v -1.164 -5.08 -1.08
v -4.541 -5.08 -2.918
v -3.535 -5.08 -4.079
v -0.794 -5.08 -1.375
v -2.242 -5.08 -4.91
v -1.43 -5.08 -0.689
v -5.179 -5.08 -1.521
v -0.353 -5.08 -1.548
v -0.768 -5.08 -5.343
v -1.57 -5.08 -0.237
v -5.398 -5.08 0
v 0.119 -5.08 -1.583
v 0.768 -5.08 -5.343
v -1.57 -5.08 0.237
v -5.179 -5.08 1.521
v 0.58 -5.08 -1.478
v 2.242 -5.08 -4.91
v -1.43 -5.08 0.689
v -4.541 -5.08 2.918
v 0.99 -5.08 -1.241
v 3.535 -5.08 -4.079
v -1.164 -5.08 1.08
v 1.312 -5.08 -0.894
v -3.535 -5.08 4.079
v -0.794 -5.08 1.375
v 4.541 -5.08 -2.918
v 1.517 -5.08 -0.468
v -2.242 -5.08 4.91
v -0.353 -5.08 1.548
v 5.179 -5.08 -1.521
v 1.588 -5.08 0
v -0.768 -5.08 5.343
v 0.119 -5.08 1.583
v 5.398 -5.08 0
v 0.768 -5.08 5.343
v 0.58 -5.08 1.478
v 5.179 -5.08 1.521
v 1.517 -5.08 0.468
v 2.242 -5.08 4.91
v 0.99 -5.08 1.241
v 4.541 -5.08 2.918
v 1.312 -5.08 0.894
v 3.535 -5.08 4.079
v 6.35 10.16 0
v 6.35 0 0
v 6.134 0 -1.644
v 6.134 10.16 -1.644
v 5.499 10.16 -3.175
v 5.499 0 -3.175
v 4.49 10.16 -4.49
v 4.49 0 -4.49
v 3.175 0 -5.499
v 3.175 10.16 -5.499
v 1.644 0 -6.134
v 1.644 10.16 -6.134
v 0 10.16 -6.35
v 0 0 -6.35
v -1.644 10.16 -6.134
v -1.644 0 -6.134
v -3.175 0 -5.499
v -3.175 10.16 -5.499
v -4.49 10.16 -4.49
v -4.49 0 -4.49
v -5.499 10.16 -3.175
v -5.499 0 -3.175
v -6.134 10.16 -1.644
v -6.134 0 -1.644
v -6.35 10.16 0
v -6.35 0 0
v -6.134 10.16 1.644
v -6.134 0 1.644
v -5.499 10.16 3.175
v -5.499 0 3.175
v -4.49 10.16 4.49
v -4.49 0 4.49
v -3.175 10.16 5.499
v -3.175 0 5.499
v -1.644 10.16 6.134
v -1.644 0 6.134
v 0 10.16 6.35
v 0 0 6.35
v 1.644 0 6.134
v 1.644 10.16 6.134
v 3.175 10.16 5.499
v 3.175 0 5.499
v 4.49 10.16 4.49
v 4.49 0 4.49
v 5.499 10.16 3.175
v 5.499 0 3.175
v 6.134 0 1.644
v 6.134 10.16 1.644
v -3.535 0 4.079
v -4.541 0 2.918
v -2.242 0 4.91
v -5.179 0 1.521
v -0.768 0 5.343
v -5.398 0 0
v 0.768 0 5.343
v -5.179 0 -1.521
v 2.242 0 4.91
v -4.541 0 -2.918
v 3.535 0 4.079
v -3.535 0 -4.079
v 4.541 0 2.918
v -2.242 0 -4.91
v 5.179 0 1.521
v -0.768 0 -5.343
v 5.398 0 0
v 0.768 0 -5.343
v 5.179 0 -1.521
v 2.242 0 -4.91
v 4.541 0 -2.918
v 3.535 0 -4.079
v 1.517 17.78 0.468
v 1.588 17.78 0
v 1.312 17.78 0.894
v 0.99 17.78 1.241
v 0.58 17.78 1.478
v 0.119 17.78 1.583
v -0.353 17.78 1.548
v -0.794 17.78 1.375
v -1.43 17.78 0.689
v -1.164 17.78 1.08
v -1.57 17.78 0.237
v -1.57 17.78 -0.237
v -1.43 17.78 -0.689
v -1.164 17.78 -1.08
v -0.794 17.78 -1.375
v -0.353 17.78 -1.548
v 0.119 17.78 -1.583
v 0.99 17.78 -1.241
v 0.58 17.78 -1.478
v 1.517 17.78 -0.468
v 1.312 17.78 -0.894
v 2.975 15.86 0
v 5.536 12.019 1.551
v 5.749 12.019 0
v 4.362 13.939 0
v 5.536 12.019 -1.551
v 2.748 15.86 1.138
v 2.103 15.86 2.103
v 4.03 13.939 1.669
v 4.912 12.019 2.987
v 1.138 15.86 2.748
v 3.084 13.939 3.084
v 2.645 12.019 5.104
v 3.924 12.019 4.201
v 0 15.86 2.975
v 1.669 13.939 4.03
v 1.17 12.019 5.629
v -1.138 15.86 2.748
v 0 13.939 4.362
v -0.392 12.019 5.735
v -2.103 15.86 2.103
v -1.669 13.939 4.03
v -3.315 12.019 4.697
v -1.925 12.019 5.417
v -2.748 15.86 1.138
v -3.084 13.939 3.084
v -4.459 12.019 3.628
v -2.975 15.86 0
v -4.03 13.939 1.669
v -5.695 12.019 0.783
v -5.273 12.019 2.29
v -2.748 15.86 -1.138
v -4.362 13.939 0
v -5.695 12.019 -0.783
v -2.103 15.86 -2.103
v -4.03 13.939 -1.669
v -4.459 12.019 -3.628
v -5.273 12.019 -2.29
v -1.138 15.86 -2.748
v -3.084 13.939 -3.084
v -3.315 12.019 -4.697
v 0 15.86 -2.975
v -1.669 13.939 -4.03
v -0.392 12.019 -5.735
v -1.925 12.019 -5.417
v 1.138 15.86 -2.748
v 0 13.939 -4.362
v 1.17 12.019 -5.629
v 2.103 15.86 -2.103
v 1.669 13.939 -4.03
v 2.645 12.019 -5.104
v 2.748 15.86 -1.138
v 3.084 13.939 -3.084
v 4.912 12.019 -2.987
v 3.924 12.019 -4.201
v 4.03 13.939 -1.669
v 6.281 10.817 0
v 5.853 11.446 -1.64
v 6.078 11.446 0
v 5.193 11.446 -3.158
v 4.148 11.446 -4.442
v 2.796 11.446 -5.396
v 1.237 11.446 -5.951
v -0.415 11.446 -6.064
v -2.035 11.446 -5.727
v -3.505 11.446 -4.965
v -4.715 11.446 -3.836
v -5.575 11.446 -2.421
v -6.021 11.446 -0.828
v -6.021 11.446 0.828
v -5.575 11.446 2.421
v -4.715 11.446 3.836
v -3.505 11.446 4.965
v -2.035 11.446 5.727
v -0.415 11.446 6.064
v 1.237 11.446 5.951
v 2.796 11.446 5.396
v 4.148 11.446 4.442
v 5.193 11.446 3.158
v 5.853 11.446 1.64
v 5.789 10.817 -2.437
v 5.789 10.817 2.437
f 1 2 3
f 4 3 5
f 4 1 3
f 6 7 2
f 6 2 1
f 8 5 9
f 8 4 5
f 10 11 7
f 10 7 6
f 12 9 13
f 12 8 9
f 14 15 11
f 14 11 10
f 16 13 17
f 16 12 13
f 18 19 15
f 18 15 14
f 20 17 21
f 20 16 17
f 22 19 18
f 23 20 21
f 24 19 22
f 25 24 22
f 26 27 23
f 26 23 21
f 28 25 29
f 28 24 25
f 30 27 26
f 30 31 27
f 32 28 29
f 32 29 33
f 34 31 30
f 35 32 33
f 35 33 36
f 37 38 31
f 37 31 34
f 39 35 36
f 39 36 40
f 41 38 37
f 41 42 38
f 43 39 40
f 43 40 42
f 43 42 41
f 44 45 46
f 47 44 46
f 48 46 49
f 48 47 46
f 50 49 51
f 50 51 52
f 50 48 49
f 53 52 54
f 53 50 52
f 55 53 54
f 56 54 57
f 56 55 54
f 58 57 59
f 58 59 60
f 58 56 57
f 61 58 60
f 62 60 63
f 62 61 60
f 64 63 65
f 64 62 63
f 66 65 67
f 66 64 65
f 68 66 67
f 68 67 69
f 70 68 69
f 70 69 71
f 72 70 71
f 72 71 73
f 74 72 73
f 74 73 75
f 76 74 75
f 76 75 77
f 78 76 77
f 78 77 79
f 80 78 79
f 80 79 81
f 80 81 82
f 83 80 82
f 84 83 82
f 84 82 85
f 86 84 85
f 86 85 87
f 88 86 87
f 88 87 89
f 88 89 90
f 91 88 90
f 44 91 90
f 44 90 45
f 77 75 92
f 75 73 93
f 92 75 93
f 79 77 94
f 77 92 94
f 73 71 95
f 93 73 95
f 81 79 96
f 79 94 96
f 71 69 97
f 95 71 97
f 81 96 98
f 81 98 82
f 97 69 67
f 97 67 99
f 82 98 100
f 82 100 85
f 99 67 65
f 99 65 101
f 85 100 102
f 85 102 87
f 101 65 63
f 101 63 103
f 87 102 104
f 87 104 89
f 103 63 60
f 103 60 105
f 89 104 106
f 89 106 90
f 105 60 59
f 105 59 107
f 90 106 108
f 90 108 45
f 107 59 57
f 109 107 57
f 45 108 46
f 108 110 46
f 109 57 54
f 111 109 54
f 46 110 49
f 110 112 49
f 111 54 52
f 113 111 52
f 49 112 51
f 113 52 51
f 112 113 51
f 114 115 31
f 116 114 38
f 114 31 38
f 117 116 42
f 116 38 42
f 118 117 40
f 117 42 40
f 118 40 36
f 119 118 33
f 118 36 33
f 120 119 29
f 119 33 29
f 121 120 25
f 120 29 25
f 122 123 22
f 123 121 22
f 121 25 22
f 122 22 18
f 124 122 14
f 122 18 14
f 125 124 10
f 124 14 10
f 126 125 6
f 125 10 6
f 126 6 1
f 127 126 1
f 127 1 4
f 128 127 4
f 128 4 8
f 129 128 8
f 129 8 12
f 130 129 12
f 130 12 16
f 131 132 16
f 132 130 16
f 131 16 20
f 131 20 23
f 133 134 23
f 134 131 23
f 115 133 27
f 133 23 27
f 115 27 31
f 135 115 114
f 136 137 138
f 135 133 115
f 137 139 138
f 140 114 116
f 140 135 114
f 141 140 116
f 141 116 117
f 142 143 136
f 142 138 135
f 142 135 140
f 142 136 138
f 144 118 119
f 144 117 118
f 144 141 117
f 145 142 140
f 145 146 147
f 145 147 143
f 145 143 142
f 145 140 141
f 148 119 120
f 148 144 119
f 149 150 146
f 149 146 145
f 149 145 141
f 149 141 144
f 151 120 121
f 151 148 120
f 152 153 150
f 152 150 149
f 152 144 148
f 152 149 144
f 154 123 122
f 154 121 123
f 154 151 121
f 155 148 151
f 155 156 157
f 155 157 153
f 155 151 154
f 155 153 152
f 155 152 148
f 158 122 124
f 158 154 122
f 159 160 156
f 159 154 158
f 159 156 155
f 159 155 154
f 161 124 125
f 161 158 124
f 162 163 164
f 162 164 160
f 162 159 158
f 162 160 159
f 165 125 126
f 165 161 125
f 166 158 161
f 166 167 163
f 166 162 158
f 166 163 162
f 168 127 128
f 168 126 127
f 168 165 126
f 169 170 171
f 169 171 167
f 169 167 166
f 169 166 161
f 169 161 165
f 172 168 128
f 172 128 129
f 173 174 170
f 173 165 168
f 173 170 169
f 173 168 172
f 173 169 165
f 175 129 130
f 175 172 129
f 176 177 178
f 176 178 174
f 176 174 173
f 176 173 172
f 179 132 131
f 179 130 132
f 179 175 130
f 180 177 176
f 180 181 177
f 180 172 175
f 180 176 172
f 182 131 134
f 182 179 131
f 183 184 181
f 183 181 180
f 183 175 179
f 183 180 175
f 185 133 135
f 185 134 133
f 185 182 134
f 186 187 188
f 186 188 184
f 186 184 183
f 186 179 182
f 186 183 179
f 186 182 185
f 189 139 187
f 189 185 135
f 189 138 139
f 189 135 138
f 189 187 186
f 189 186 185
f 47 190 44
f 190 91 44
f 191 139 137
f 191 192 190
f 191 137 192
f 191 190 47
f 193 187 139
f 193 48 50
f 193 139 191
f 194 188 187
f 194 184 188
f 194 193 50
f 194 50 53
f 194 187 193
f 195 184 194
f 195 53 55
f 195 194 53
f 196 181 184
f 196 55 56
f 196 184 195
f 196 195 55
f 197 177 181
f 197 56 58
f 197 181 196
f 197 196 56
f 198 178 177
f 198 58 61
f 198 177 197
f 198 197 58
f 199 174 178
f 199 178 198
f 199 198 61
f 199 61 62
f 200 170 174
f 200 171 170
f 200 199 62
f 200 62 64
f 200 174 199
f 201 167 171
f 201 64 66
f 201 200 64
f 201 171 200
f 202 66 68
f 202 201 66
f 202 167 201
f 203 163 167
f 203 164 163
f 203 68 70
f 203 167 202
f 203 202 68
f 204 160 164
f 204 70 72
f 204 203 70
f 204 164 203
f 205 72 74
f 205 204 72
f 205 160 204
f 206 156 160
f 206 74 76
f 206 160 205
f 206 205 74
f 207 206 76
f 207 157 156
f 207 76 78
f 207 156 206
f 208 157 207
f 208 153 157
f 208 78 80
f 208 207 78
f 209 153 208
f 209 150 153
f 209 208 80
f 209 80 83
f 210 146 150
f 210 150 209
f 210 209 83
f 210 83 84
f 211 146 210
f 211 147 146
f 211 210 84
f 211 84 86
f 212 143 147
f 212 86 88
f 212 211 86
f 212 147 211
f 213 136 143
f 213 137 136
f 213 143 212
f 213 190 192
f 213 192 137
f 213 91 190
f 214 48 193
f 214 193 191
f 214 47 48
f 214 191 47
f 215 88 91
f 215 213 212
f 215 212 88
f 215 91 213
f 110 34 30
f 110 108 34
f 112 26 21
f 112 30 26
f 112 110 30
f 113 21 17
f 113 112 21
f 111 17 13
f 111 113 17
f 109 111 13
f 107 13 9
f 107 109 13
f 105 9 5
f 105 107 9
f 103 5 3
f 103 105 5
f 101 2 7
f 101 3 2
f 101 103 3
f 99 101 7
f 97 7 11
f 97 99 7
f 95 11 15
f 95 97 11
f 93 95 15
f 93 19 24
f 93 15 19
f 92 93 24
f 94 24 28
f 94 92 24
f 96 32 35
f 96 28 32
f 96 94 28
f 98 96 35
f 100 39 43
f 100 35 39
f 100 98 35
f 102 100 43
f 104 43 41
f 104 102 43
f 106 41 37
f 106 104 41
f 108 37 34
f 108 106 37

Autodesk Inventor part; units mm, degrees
ref_plane "YZ Plane" through (0, 0, 0) normal (1, 0, 0) x (0, 1, 0)
ref_plane "XZ Plane" through (0, 0, 0) normal (0, 1, 0) x (-1, 0, 0)
ref_plane "XY Plane" through (0, 0, 0) normal (0, 0, 1) x (1, 0, 0)
sketch "Sketch1" plane through (0, 0, 0) normal (0, 0, 1) x (1, 0, 0)
  line L0 (0, 0) -> (6.35, 0)
  line L1 (6.35, 0) -> (6.35, 10.16)
  line L2 (0, 17.78) -> (1.5875, 17.78)
  line L3 (1.5875, 17.78) -> (5.7488, 12.0191)
  arc A0 (6.35, 10.16) -> (5.7488, 12.0191) centre (3.175, 10.16) ccw
  line L4 (0, 0) -> (3.175, 0)
  line L5 (1.5875, 17.78) -> (1.5875, 0)
  line L6 (6.35, 0) -> (1.5875, 0)
  line L7 (0, -3.556) -> (0, 21.336) projected
  dimension "d0" = 6.35
  dimension "d3" = 1.5875
  dimension "d4" = 3.175
  dimension "d9" = 10.16
  dimension "d10" = 17.78
revolve "Revolution1" add sketch "Sketch1" angle 360 about axis through (0, -10, 0) along (0, 1, 0) contours L5 L3 A0 L1 L0
sketch "Sketch2" plane through (0, 0, 0) normal (0, -1, 0) x (1, 0, 0)
  circle A0 centre (0, 0) radius 1.5875 projected
  circle A1 centre (0, 0) radius 1.5875
  circle A2 centre (0, 0) radius 5.3975
  dimension "d6" = 10.795
extrude "Extrusion1" add sketch "Sketch2" along normal blind 5.08
properties part number "tipthick1024"
